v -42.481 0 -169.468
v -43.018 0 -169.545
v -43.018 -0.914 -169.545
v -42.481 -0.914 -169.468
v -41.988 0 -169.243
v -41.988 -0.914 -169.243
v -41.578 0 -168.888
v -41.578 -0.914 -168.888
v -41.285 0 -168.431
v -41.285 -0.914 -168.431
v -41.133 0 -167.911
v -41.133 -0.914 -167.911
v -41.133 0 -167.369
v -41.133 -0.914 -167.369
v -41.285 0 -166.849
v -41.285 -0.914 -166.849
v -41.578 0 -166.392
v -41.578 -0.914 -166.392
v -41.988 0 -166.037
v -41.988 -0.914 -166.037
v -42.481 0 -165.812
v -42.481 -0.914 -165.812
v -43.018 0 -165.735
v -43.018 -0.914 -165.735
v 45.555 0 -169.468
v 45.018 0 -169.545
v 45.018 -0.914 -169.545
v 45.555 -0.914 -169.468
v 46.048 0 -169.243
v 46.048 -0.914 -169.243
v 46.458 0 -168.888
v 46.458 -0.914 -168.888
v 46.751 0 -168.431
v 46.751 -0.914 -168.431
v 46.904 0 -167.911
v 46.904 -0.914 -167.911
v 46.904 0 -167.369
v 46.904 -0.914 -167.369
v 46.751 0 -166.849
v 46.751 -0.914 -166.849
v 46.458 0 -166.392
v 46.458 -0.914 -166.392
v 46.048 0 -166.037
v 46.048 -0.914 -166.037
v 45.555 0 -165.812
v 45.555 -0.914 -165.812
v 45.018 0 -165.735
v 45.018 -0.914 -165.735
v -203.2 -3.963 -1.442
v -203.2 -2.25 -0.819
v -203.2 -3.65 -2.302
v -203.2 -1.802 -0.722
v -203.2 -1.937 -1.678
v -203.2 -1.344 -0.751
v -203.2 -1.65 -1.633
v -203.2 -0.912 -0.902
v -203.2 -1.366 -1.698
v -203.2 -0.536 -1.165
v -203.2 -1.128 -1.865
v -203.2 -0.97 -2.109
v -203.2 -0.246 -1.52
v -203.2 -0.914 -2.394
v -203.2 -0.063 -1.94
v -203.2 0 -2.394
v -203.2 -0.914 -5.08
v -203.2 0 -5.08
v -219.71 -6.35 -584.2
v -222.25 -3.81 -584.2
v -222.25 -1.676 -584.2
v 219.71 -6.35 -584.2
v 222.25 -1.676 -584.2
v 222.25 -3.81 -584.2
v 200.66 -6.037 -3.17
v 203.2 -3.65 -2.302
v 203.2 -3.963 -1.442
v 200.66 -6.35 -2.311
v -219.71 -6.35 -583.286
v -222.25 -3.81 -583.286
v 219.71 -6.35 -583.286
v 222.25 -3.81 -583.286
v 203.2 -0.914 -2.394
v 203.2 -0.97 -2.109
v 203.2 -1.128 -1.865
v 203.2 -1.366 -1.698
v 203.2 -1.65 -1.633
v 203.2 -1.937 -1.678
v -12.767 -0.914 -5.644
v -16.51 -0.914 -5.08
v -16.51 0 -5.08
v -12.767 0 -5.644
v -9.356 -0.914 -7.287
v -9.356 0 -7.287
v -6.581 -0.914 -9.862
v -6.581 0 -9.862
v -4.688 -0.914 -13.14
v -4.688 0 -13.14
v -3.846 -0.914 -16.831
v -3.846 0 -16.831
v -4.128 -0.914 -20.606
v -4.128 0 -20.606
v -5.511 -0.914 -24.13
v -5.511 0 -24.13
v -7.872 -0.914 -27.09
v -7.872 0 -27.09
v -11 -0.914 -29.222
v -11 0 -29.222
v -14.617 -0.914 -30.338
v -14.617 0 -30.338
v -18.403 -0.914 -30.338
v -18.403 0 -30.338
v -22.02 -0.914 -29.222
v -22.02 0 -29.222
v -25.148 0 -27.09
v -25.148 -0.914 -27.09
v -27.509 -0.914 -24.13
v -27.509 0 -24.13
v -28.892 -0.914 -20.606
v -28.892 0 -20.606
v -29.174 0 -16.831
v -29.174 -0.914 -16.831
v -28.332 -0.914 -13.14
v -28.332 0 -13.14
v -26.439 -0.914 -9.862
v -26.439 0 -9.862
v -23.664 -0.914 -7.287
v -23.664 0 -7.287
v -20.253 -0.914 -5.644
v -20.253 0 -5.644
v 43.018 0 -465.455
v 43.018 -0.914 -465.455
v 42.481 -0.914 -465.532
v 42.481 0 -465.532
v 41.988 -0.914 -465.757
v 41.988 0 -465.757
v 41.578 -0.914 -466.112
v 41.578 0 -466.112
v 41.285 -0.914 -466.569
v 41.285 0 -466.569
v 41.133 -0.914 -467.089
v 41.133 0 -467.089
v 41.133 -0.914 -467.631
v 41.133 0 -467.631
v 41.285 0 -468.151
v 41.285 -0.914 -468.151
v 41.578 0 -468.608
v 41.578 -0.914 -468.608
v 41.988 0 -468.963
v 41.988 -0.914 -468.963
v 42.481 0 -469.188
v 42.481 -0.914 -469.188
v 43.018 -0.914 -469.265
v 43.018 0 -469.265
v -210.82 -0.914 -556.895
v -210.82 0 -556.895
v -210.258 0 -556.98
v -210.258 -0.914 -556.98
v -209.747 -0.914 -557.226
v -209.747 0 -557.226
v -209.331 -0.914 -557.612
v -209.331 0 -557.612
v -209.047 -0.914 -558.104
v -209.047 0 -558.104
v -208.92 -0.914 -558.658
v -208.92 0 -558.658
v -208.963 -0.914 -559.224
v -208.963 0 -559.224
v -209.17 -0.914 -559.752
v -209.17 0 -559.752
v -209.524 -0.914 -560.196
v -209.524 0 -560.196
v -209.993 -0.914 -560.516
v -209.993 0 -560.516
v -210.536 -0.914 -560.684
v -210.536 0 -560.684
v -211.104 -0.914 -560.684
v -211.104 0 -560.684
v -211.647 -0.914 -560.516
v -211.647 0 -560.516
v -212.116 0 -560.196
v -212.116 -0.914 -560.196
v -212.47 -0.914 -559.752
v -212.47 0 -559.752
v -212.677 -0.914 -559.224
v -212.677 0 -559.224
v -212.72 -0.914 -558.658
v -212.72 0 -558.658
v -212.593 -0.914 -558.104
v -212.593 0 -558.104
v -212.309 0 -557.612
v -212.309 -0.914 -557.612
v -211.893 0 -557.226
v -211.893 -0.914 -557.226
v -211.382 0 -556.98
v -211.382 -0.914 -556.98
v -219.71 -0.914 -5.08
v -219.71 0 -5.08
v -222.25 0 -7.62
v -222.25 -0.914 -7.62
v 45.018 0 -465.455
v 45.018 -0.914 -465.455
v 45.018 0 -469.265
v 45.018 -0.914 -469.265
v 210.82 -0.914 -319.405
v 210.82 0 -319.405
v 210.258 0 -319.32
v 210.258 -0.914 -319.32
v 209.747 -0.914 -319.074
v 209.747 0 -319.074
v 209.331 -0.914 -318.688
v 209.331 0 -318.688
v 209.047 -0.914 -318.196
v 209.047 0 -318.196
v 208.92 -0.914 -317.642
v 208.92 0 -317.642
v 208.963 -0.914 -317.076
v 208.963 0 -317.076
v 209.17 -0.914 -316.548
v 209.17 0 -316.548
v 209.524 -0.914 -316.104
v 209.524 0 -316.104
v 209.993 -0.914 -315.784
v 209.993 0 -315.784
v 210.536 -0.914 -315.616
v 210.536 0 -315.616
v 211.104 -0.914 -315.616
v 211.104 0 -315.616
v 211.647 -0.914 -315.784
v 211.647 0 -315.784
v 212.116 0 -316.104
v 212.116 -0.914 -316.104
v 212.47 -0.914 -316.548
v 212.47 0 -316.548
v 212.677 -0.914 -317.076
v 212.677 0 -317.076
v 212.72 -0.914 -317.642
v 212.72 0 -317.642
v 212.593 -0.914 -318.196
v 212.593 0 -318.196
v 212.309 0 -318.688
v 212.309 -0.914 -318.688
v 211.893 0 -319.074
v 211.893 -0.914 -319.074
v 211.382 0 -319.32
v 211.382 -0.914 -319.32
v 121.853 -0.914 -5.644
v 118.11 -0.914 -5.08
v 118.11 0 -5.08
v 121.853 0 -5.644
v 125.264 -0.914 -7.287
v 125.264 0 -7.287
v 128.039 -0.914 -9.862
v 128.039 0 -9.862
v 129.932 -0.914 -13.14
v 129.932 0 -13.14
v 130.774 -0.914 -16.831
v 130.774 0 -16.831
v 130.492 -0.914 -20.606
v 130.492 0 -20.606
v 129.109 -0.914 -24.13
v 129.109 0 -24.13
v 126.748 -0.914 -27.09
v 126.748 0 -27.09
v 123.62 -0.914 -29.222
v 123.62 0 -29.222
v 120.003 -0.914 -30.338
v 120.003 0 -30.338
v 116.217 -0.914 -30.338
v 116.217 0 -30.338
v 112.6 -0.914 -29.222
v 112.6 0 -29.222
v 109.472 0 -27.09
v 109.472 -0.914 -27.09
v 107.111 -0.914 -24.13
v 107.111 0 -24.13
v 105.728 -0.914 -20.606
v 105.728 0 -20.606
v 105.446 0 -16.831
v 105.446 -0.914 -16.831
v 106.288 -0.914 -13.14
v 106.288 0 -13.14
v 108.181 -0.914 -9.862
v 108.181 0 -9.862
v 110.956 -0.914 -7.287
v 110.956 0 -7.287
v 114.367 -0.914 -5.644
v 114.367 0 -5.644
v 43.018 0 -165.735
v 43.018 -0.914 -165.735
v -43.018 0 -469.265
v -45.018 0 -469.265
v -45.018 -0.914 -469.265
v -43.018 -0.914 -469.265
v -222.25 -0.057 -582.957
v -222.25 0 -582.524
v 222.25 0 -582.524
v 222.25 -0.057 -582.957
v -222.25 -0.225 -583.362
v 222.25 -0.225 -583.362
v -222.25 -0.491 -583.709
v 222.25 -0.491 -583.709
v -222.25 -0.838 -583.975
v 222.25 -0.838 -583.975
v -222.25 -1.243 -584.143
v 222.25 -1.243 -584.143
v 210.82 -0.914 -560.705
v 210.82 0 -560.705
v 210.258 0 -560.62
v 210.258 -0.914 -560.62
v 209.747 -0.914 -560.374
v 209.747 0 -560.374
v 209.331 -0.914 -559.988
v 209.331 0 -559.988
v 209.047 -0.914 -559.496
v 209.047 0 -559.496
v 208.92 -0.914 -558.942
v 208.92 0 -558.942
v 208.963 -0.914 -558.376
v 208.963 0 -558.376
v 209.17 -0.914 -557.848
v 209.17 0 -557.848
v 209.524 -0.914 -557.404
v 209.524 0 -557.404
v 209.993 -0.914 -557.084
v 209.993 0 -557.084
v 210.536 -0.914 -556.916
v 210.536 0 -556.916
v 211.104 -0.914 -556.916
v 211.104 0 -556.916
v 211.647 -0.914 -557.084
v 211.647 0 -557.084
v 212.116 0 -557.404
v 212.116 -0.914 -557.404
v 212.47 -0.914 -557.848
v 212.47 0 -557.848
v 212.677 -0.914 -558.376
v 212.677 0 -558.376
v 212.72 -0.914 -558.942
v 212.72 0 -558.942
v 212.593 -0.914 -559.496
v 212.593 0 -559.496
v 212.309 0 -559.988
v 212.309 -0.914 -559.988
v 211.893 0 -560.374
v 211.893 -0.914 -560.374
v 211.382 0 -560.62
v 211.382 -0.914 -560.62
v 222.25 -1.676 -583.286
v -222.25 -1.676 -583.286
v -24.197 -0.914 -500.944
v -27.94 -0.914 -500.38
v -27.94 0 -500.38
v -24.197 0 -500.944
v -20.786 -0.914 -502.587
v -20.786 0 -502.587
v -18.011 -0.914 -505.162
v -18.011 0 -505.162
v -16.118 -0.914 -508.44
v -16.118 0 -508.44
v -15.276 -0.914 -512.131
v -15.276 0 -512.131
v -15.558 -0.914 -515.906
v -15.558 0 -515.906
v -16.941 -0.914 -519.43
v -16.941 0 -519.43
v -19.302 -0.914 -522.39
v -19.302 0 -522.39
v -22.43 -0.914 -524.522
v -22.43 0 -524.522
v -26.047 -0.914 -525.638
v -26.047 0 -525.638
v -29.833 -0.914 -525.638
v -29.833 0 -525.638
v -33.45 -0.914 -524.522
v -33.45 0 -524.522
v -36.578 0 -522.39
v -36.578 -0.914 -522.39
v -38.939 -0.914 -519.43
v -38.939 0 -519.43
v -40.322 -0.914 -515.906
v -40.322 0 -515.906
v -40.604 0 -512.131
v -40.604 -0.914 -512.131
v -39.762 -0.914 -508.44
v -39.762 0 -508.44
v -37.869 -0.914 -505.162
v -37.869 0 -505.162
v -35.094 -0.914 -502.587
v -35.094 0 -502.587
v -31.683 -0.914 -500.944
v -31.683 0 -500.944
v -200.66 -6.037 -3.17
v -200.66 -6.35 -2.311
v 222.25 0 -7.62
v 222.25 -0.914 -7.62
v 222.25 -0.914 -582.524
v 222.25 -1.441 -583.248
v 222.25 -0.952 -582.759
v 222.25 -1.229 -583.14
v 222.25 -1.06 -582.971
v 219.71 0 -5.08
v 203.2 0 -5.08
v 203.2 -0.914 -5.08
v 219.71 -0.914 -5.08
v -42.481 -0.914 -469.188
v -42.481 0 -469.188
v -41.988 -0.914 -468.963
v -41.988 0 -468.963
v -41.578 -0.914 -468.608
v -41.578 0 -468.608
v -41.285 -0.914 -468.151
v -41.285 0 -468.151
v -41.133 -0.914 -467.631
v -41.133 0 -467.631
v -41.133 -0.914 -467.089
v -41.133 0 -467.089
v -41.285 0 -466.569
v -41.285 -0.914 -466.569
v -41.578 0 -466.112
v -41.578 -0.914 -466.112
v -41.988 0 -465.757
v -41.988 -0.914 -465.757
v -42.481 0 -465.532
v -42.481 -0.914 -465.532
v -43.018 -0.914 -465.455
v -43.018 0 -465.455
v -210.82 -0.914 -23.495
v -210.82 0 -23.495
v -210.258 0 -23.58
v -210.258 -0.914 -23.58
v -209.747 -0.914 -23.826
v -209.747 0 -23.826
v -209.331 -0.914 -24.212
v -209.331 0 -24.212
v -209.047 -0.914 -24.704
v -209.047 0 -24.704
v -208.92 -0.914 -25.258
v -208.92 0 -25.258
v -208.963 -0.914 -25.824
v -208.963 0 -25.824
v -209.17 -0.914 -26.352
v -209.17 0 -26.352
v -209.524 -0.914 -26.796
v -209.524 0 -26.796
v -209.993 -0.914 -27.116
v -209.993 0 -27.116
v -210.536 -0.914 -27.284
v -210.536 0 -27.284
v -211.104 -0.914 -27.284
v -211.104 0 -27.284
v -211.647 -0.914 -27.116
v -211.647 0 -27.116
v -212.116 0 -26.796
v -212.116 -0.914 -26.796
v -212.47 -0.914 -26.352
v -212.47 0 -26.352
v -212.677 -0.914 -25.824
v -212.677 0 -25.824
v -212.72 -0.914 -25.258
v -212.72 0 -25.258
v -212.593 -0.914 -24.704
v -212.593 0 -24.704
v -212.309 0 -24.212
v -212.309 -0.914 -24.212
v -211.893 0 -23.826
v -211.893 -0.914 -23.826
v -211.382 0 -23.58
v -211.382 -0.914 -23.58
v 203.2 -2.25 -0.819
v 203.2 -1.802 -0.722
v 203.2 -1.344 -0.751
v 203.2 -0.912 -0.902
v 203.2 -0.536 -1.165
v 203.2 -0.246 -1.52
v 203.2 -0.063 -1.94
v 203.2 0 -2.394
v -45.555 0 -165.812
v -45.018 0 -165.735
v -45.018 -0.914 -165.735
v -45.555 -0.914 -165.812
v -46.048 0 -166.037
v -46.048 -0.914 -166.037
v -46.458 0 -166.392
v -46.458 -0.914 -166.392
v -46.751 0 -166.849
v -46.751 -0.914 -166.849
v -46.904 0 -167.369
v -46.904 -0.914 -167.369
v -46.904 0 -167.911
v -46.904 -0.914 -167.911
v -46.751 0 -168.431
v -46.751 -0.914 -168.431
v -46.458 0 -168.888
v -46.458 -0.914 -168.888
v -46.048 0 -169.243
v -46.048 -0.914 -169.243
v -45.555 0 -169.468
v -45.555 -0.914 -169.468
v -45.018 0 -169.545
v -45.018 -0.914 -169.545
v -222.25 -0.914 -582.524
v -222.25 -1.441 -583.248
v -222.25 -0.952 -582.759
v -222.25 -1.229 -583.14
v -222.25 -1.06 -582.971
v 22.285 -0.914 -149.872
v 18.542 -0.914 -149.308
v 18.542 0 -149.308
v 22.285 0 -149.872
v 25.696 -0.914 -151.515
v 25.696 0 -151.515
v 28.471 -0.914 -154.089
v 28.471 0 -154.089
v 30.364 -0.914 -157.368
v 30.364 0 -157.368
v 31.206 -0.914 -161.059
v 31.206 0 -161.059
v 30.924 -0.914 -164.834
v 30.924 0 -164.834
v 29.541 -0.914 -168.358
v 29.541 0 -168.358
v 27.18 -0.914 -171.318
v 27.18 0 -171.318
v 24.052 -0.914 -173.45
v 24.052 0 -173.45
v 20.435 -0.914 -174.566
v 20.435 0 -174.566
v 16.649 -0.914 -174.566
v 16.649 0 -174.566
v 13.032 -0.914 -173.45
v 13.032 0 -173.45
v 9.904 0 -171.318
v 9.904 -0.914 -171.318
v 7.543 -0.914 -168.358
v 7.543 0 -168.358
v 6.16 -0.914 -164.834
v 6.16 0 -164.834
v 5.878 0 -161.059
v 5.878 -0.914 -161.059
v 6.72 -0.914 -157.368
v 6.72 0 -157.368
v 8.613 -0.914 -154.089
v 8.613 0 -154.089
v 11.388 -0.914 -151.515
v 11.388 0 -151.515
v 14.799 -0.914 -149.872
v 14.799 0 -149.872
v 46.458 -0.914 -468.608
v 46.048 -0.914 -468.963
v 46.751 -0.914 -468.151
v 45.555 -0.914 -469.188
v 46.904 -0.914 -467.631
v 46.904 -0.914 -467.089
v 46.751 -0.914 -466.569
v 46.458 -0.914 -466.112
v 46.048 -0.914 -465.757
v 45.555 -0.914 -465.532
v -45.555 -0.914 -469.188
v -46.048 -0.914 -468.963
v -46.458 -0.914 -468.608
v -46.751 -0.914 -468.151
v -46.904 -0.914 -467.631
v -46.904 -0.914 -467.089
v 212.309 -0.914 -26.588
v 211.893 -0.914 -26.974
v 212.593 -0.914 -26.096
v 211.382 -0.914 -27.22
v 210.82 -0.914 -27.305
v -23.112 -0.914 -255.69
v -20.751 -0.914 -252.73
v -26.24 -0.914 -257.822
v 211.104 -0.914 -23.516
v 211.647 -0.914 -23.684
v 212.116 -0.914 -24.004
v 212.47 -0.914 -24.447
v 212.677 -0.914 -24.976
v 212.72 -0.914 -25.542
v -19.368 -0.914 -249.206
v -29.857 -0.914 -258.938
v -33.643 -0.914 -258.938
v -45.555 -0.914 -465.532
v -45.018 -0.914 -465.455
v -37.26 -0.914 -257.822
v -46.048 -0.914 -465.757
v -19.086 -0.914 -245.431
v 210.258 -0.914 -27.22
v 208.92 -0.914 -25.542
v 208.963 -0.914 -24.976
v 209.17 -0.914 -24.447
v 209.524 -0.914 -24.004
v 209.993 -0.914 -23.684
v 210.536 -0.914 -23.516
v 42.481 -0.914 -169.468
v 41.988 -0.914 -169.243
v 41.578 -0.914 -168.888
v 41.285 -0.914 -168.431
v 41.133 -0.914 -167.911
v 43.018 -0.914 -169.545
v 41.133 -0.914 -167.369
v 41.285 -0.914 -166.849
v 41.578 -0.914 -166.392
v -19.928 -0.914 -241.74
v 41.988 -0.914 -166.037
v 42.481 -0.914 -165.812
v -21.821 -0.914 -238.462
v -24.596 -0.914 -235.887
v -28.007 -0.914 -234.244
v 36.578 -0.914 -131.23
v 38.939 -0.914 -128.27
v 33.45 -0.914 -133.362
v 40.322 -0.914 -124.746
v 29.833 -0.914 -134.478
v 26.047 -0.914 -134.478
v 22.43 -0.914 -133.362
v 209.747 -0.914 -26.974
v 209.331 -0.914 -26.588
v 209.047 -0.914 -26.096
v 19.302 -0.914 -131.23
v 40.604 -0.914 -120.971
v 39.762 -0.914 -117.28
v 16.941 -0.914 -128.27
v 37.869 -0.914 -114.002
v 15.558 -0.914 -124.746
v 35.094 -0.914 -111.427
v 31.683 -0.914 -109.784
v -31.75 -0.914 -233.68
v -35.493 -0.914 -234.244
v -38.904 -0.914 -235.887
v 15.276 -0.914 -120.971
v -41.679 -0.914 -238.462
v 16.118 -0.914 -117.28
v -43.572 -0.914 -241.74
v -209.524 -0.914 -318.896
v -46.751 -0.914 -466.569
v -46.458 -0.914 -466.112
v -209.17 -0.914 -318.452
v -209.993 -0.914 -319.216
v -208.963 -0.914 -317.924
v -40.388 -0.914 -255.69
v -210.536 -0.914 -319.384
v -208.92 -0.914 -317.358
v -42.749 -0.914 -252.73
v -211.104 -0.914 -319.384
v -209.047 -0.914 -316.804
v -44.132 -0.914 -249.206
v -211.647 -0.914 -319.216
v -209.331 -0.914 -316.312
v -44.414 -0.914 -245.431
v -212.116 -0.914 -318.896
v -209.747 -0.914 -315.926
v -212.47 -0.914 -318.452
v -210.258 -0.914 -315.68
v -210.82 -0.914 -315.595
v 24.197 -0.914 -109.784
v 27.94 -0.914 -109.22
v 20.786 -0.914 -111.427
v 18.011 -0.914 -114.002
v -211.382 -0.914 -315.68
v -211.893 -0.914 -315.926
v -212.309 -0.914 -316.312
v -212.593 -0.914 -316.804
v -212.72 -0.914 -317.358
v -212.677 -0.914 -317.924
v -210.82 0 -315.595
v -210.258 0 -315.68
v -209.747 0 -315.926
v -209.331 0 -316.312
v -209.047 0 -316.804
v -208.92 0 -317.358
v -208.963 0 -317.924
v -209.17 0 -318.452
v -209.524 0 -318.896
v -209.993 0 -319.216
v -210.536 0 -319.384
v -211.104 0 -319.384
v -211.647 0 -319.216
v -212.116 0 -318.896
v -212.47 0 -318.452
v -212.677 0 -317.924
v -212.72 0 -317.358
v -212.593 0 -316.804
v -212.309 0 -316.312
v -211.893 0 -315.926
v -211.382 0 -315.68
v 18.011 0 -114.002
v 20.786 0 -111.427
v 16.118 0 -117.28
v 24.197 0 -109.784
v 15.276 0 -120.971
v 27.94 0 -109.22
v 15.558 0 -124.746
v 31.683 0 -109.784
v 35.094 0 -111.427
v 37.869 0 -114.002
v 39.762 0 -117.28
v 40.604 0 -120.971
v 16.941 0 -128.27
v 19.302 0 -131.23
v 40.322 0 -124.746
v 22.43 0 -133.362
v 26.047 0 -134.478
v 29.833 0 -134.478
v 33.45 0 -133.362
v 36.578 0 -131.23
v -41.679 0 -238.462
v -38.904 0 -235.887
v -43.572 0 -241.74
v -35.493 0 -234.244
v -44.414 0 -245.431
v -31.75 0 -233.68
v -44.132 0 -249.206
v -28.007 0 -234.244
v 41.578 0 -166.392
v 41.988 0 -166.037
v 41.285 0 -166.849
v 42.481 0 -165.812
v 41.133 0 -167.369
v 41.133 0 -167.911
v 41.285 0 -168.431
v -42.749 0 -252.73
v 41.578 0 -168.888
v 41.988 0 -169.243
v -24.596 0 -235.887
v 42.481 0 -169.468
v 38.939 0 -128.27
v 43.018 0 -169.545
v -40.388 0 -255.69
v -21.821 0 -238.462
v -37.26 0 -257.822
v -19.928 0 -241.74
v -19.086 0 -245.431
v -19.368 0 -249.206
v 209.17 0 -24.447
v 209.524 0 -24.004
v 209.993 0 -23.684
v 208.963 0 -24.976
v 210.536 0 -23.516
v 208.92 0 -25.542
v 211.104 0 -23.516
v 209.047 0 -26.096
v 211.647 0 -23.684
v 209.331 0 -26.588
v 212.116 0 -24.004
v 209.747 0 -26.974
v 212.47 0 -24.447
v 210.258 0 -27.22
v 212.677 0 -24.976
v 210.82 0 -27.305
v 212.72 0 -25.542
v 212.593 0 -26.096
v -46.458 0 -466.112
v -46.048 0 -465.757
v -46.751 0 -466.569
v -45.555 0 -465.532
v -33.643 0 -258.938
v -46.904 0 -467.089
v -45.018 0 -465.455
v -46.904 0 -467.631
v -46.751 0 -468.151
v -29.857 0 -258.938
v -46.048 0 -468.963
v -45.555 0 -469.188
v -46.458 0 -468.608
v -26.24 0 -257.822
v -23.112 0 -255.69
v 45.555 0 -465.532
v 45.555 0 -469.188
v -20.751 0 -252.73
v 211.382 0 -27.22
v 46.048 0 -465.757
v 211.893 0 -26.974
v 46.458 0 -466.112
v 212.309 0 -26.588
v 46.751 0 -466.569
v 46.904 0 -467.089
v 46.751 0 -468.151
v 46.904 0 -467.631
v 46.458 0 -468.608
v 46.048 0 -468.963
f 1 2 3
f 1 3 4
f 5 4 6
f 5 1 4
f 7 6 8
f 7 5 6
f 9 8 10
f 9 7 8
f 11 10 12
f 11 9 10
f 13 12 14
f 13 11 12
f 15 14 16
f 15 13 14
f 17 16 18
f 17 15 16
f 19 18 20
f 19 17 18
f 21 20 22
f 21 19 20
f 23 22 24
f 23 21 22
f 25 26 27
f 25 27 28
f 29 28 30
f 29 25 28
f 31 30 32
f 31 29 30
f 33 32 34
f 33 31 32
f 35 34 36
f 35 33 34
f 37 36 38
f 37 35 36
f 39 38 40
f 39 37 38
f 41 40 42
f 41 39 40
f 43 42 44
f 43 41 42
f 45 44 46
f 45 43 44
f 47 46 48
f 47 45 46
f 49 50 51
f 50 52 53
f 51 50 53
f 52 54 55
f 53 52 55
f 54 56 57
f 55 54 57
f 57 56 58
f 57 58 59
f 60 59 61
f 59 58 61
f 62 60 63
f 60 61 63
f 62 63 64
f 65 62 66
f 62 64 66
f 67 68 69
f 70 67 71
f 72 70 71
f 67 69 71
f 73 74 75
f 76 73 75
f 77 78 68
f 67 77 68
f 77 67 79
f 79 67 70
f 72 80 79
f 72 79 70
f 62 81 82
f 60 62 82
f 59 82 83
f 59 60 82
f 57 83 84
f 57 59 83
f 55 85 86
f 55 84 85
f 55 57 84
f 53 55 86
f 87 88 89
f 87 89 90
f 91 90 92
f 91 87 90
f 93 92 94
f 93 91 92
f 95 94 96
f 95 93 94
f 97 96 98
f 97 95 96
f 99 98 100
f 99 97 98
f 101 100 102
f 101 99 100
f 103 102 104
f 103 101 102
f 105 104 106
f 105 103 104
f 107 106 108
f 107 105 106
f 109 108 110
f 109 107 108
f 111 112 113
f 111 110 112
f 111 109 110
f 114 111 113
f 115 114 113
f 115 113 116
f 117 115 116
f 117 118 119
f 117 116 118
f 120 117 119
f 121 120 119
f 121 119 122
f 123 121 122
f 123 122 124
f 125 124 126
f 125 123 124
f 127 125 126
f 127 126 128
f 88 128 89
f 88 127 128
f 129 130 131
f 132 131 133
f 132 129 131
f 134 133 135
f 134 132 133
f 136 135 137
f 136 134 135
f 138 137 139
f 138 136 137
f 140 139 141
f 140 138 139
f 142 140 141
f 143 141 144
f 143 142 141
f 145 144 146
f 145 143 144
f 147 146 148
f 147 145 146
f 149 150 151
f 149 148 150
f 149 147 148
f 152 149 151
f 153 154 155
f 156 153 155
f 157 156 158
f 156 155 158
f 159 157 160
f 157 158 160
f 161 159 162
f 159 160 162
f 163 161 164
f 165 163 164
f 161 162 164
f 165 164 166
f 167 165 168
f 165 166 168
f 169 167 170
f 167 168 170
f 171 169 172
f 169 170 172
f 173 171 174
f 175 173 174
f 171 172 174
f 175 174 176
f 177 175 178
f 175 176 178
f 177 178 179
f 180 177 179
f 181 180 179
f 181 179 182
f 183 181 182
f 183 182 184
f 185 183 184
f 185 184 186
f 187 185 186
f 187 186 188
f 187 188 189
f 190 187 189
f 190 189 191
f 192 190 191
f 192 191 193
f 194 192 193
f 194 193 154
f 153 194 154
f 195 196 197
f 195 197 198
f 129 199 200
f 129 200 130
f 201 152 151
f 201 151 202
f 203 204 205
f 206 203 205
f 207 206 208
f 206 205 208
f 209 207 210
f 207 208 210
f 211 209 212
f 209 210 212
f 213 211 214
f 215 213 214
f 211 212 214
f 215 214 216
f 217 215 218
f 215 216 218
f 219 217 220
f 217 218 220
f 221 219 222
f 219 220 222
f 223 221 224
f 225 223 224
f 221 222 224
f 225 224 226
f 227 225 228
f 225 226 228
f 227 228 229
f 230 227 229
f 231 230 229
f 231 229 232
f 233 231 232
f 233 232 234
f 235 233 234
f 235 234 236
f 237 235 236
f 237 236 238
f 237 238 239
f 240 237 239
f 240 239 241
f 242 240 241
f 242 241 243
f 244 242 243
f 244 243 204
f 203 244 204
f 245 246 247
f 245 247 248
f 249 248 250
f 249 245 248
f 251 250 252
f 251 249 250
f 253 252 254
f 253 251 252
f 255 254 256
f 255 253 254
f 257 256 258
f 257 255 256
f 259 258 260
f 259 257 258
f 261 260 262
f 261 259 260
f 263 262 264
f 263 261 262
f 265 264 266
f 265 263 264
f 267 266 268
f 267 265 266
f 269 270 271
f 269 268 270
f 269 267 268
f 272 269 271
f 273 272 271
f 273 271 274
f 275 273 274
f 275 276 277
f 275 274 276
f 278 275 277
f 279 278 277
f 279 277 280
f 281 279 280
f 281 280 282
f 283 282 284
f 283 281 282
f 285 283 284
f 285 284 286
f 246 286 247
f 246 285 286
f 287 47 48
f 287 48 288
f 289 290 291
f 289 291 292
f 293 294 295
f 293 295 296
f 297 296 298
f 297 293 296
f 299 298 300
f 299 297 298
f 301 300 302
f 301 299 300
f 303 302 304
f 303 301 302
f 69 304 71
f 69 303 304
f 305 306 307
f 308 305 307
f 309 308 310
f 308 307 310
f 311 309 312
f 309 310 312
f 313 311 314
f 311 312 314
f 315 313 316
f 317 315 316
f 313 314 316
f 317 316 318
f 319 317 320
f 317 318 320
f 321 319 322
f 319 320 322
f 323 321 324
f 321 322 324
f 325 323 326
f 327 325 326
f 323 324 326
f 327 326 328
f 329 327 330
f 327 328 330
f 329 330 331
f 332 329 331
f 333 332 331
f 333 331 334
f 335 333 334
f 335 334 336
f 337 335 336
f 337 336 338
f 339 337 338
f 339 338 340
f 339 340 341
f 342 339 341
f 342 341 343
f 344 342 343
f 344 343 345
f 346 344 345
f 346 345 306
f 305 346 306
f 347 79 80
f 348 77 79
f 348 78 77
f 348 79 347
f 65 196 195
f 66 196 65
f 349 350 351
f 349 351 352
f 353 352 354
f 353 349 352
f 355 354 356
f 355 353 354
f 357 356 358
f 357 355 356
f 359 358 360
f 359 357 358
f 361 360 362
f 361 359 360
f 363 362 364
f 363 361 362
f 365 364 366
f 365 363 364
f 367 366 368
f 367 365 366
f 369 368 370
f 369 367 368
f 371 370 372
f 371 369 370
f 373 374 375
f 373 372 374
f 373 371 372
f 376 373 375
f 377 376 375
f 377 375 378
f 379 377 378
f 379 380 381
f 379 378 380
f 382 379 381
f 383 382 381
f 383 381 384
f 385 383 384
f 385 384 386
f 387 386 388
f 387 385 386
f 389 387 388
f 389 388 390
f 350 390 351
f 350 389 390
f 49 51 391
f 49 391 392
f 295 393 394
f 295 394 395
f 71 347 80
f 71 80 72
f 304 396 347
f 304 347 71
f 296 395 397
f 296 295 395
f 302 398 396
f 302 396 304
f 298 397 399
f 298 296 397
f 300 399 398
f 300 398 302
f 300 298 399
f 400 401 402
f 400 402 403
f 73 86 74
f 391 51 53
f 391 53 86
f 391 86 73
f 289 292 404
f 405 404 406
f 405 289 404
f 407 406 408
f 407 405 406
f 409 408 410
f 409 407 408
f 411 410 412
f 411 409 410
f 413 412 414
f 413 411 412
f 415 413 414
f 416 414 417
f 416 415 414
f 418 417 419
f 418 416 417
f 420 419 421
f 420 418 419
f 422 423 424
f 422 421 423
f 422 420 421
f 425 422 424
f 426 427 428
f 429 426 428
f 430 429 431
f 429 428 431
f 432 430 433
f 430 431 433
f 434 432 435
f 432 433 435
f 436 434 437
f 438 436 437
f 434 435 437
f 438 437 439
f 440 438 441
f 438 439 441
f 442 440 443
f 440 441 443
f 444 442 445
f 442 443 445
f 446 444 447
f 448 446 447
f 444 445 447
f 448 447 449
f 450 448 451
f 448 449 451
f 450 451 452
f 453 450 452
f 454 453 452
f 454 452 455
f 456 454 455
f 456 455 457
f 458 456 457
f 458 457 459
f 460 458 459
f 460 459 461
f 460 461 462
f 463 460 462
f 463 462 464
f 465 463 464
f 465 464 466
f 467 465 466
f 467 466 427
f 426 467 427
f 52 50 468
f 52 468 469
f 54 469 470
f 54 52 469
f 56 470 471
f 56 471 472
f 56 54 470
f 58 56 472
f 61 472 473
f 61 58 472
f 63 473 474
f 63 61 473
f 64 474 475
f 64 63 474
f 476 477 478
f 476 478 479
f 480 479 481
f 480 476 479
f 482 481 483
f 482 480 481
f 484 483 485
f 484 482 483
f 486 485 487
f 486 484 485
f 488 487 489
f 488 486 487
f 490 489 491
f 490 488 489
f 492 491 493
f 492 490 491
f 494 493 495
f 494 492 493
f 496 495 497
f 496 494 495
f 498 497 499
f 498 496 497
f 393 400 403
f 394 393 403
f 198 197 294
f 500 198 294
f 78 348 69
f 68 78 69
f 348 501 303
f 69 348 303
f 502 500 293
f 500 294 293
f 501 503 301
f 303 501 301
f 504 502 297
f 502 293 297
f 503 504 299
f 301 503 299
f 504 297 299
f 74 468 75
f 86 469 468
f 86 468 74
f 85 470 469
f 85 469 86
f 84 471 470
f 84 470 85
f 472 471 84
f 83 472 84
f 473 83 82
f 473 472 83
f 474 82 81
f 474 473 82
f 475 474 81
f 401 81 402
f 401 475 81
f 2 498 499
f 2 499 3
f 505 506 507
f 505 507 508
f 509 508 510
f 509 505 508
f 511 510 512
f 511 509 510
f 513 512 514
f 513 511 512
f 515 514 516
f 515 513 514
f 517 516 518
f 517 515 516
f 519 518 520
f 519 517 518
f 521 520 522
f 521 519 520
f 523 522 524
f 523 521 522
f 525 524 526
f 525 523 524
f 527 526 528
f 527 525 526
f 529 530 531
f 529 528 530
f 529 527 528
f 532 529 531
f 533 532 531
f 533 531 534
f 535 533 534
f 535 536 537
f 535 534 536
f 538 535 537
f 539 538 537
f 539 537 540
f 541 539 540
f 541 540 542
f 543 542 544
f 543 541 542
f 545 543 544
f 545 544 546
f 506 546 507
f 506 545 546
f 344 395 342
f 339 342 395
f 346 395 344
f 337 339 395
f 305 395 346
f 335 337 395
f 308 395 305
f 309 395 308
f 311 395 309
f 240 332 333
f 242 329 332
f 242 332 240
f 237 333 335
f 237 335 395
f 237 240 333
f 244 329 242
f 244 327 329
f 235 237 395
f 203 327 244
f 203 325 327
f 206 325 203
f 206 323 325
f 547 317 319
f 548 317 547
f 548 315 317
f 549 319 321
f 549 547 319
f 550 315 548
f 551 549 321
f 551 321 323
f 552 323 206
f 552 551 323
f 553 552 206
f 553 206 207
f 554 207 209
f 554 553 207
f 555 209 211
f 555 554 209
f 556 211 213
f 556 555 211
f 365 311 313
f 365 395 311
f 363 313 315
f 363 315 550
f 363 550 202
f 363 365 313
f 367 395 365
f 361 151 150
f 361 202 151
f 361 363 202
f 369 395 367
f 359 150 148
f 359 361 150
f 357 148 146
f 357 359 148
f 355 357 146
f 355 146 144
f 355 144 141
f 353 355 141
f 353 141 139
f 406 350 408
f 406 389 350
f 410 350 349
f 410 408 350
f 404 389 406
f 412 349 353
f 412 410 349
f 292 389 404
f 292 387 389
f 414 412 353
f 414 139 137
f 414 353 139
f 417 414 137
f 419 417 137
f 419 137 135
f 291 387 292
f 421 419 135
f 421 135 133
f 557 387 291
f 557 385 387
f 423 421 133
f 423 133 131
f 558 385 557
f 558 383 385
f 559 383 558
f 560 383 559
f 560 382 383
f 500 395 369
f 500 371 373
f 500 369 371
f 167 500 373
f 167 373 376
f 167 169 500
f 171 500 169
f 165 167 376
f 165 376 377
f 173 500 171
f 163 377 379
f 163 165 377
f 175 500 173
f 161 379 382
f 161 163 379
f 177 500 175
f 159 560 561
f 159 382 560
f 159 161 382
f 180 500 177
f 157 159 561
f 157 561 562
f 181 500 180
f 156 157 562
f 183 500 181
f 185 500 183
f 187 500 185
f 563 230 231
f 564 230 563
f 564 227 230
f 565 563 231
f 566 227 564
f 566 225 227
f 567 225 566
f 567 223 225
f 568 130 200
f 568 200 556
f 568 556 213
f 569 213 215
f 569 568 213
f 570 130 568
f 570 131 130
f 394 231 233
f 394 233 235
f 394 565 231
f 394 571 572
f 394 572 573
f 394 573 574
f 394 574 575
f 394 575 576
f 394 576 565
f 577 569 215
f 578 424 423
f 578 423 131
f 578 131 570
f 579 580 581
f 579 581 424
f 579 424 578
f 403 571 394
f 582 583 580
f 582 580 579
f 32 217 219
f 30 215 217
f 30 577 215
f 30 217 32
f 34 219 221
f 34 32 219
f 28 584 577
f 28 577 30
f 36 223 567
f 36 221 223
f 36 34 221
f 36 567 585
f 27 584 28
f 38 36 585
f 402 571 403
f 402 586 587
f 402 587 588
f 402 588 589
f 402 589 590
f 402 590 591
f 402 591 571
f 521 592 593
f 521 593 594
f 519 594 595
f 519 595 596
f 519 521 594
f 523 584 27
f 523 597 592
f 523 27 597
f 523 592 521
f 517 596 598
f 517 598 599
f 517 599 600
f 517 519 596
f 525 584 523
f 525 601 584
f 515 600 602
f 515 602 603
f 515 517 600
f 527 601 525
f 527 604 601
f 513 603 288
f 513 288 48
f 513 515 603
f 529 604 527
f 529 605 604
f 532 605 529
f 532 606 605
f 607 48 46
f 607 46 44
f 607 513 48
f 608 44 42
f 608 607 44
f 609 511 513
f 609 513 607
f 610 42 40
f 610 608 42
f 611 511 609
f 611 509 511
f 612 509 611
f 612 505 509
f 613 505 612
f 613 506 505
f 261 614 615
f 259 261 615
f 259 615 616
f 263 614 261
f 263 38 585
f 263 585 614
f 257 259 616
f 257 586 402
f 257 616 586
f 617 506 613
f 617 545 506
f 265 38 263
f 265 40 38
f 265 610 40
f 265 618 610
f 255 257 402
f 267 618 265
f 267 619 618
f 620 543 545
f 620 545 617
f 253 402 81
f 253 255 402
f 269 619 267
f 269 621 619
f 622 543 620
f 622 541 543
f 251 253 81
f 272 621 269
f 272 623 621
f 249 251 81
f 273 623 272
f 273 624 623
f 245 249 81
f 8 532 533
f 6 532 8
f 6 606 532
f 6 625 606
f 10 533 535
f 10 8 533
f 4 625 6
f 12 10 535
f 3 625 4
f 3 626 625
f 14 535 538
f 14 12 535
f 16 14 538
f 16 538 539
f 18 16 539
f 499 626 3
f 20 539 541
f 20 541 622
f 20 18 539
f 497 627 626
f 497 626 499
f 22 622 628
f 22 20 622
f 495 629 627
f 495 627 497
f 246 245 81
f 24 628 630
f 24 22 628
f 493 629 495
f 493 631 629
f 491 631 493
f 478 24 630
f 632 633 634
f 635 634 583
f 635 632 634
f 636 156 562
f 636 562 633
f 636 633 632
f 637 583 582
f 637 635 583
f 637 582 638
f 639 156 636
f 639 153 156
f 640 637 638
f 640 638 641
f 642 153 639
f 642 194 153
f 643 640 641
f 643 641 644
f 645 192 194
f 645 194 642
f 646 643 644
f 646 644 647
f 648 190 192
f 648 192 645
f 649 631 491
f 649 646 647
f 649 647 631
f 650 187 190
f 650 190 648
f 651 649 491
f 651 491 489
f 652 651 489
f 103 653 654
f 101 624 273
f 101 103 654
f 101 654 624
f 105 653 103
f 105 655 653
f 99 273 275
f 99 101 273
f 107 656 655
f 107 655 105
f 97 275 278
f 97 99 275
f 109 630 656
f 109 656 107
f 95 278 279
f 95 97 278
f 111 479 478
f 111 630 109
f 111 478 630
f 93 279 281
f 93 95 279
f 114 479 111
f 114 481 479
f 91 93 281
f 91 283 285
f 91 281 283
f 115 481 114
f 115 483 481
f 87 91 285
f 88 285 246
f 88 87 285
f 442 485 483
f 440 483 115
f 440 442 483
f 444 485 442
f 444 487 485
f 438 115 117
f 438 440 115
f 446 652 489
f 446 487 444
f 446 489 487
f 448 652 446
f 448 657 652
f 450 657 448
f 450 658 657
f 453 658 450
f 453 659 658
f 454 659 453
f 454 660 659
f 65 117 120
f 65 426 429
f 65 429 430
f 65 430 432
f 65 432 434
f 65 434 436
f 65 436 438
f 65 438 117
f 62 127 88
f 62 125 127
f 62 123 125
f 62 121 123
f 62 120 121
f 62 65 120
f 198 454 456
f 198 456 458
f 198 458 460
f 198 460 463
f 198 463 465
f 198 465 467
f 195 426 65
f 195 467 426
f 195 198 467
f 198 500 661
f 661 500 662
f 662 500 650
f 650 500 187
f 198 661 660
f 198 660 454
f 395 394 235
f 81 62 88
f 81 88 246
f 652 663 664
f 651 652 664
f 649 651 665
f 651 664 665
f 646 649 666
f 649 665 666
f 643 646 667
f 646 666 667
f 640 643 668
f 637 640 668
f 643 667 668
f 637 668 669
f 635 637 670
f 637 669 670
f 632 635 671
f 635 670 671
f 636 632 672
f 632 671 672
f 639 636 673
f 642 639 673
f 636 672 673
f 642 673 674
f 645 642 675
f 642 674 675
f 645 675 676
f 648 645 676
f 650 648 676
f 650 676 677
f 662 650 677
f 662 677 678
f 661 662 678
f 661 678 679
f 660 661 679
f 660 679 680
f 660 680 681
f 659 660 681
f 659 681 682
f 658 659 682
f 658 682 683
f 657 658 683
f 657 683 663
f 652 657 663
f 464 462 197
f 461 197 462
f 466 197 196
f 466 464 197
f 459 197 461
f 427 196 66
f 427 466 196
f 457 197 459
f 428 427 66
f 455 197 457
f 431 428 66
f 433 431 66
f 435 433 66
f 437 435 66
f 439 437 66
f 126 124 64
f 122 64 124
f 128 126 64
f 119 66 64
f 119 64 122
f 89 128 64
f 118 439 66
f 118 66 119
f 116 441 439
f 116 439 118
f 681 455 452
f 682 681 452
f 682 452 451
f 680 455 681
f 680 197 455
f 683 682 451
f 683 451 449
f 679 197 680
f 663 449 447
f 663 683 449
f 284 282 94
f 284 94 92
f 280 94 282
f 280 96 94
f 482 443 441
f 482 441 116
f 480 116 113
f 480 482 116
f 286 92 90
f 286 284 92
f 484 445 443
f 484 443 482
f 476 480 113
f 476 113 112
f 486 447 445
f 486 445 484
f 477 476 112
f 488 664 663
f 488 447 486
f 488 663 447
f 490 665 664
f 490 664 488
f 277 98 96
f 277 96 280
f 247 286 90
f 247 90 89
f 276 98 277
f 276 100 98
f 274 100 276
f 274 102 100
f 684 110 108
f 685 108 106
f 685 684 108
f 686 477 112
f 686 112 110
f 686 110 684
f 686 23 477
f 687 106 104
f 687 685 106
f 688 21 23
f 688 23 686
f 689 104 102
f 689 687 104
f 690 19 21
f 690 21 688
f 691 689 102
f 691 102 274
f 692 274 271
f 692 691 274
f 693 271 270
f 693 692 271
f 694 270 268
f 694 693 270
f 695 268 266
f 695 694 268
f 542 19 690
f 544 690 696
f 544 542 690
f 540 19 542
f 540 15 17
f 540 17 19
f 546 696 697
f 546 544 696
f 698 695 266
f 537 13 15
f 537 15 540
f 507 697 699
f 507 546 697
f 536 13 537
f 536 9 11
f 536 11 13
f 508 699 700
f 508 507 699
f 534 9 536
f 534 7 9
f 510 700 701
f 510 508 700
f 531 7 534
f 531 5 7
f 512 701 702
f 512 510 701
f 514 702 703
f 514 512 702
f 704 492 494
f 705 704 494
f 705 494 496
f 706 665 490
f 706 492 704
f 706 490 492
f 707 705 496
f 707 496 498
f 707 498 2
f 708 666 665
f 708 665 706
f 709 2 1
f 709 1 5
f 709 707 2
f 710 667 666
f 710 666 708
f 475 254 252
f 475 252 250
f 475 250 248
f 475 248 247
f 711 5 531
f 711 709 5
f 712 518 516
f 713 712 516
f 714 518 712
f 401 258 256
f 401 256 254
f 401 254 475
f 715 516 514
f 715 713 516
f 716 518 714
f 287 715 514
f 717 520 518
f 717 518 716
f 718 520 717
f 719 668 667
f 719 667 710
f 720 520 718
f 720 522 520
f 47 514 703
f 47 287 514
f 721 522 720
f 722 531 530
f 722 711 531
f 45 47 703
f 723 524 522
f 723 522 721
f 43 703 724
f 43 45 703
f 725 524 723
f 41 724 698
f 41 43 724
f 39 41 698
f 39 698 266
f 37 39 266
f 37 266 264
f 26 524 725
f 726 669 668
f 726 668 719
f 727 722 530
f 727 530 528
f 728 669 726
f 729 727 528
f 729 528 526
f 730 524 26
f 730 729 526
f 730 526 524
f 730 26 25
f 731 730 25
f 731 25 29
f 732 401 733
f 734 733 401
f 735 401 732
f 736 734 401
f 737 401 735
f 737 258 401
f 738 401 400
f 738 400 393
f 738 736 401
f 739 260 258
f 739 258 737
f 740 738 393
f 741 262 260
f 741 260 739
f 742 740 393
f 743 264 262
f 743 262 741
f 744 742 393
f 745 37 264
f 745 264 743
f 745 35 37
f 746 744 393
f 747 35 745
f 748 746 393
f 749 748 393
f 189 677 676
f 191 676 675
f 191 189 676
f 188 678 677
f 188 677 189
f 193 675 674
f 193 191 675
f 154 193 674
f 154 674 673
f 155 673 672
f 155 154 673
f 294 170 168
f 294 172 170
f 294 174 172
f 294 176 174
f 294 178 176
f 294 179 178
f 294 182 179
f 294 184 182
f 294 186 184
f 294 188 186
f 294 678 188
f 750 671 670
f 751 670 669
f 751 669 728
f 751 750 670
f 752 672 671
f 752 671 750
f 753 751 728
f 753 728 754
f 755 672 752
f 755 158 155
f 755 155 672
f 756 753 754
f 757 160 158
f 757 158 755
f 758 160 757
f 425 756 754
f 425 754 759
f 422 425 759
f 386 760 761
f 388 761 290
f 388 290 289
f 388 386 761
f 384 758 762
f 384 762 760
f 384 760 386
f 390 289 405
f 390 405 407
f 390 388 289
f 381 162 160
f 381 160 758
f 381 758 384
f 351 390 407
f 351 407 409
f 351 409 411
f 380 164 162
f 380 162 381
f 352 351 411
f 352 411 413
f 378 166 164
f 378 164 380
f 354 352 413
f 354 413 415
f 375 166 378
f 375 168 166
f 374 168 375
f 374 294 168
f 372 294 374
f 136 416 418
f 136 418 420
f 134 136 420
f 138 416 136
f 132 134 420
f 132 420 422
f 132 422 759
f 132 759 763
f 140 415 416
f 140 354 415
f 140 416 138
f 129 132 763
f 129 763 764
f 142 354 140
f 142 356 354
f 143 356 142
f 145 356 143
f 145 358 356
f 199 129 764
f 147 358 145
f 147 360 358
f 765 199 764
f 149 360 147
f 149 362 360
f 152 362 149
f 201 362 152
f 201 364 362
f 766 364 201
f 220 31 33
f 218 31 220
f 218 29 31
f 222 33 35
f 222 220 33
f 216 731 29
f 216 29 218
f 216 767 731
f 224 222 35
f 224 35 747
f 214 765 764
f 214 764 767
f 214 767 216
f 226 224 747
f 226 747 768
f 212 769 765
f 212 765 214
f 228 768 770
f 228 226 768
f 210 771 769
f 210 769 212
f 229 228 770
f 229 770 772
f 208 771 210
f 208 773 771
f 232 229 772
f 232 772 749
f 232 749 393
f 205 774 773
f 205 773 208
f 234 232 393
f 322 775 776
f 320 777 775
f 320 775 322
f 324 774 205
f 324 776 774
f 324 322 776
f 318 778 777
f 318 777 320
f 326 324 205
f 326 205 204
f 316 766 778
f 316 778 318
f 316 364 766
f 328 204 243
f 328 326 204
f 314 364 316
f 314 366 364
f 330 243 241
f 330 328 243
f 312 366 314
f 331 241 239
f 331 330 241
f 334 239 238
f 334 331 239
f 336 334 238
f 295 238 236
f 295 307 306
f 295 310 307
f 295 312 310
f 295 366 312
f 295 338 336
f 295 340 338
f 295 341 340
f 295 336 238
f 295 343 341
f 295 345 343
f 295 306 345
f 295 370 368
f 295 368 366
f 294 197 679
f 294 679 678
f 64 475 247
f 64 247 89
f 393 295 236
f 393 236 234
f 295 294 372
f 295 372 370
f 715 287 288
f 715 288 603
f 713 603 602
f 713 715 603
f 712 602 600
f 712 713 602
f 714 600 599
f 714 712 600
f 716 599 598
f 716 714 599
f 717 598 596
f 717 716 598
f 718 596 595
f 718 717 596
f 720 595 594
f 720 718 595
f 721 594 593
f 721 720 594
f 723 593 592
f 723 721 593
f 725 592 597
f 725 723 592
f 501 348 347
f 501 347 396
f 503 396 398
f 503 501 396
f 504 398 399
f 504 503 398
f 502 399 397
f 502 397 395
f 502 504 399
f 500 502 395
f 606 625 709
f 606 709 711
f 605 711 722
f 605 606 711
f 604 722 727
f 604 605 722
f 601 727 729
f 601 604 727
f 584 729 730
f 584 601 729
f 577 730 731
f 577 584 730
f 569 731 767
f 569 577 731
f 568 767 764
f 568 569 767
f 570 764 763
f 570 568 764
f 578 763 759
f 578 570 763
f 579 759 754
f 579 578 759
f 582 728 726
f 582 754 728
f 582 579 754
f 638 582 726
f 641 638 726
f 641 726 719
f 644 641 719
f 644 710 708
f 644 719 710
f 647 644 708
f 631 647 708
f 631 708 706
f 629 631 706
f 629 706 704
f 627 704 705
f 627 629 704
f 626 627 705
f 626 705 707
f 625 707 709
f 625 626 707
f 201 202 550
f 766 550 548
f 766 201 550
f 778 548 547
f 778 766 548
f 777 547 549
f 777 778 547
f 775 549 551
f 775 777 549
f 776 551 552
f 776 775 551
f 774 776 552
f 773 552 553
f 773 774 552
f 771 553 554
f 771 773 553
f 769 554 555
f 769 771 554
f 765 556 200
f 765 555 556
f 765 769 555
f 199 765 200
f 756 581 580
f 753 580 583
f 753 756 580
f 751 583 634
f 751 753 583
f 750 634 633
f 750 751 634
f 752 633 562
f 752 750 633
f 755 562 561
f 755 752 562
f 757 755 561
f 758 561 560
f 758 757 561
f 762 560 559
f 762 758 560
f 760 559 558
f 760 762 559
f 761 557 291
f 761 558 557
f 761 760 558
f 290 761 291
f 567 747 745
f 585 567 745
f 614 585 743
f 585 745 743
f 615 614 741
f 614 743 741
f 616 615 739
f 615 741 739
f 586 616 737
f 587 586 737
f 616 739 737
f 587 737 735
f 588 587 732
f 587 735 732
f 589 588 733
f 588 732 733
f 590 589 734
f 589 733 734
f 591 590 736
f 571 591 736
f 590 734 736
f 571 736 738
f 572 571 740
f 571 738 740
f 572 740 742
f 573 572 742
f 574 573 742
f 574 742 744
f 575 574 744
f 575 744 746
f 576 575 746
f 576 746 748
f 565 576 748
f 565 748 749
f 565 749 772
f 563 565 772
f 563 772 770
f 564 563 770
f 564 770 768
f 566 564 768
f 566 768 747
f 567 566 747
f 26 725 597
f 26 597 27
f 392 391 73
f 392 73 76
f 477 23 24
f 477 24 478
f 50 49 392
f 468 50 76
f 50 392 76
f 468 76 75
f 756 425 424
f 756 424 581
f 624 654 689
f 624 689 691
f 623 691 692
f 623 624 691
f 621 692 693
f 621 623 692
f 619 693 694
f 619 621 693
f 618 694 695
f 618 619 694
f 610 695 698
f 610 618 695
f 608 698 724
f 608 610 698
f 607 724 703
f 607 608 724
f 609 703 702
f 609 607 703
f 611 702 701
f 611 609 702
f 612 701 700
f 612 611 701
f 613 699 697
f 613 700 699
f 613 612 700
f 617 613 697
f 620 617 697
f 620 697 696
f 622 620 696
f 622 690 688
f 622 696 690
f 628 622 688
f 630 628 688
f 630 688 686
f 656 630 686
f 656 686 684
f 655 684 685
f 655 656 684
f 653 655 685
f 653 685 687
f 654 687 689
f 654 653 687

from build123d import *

# Parameters (mm, degrees)
SKETCH2_W               = 444.5
SKETCH2_H               = 584.2
BOSS_EXTRUDE1_DEPTH     = 6.35
MOVE_START              = -2.17182791
MOVE_FACE1_OUTLINE_W    = 448
MOVE_FACE1_OUTLINE_H    = 9
MOVE_FACE1_DEPTH        = 2.17182791
CONVERT_SOLID1_START    = -222.25
CONVERT_SOLID1_DEPTH    = 444.5
SKETCH7_W               = 19.05
SKETCH7_H               = 5.08
CUT_EXTRUDE1_DEPTH      = 626.080014878
SKETCH9_R               = 1.905
CUT_EXTRUDE2_DEPTH      = 1.2192
CHAMFER1_SIZE           = 2.54
CUT_EXTRUDE3_DEPTH      = 626.080014878
CUT_EXTRUDE3_DEPTH_BACK = 626.080014878
SKETCH10_R              = 12.7


# Read off the part's stored shape, not the designer's step: Move Face1, Convert-Solid1
with BuildPart() as part:
    # Sketch2 → Boss-Extrude1 (new body)
    with BuildSketch(Plane(origin=(0, 0, 0), x_dir=(1, 0, 0), z_dir=(0, 1, 0))):
        with Locations((0, 292.1)):
            Rectangle(SKETCH2_W, SKETCH2_H)
    extrude(amount=-BOSS_EXTRUDE1_DEPTH)

    # Move Face1 outline → Move Face1 (cut)
    with BuildSketch(Plane(origin=(0, 0, 0), x_dir=(1, 0, 0), z_dir=(0, 0.3420201433256691, -0.9396926207859083)).offset(MOVE_START)):
        with Locations((0, 3.5)):
            Rectangle(MOVE_FACE1_OUTLINE_W, MOVE_FACE1_OUTLINE_H)
    extrude(amount=MOVE_FACE1_DEPTH, mode=Mode.SUBTRACT)

    # Convert-Solid1 outline → Convert-Solid1 (cut)
    with BuildSketch(Plane.YZ.offset(CONVERT_SOLID1_START)):
        with BuildLine():
            Line((-6.037256781, -3.17046592), (-6.35, -2.311210988))
            Line((-6.35, -2.311210988), (-6.35, -583.2856))
            Line((-6.35, -583.2856), (-1.6764, -583.2856))
            ThreePointArc((-1.6764, -583.2856), (-1.137584633, -583.062415367), (-0.9144, -582.5236))
            Line((-0.9144, -582.5236), (-0.9144, -2.394147319))
            ThreePointArc((-0.9144, -2.394147319), (-1.239334756, -1.769953461), (-1.937019349, -1.678101541))
            Line((-1.937019349, -1.678101541), (-6.037256781, -3.17046592))
        make_face()
        with BuildLine():
            Line((0, 0), (-2.249762568, -0.818846609))
            ThreePointArc((-2.249762568, -0.818846609), (-0.714856462, -1.020920831), (0, -2.394147319))
            Line((0, -2.394147319), (0, 0))
        make_face()
        with BuildLine():
            Line((0, -584.2), (0, -582.5236))
            ThreePointArc((0, -582.5236), (-0.491006192, -583.708993808), (-1.6764, -584.2))
            Line((-1.6764, -584.2), (0, -584.2))
        make_face()
    extrude(amount=CONVERT_SOLID1_DEPTH, mode=Mode.SUBTRACT)

    # Sketch7 → Cut-Extrude1 (cut, through all)
    with BuildSketch(Plane(origin=(0, 0, 0), x_dir=(1, 0, 0), z_dir=(0, 1, 0))):
        with Locations((-212.725, 2.54)):
            Rectangle(SKETCH7_W, SKETCH7_H)
        with Locations((212.725, 2.54)):
            Rectangle(SKETCH7_W, SKETCH7_H)
    extrude(amount=-CUT_EXTRUDE1_DEPTH, mode=Mode.SUBTRACT)

    # Sketch9 → Cut-Extrude2 (cut)
    with BuildSketch(Plane(origin=(0, 0, 0), x_dir=(1, 0, 0), z_dir=(0, 1, 0))):
        with Locations(Location((-210.82, 25.4, 0), (0, 0, 270))):
            Circle(SKETCH9_R)
        with Locations(Location((-210.82, 317.5, 0), (0, 0, 270))):
            Circle(SKETCH9_R)
        with Locations(Location((-210.82, 558.8, 0), (0, 0, 270))):
            Circle(SKETCH9_R)
        with Locations(Location((210.82, 558.8, 0), (0, 0, 90))):
            Circle(SKETCH9_R)
        with Locations(Location((210.82, 317.5, 0), (0, 0, 90))):
            Circle(SKETCH9_R)
        with Locations(Location((210.82, 25.4, 0), (0, 0, 90))):
            Circle(SKETCH9_R)
        with BuildLine():
            Line((-43.0182, 465.455), (-45.0182, 465.455))
            ThreePointArc((-45.0182, 465.455), (-46.9232, 467.36), (-45.0182, 469.265))
            Line((-45.0182, 469.265), (-43.0182, 469.265))
            ThreePointArc((-43.0182, 469.265), (-41.1132, 467.36), (-43.0182, 465.455))
        make_face()
        with BuildLine():
            Line((45.0182, 465.455), (43.0182, 465.455))
            ThreePointArc((43.0182, 465.455), (41.1132, 467.36), (43.0182, 469.265))
            Line((43.0182, 469.265), (45.0182, 469.265))
            ThreePointArc((45.0182, 469.265), (46.9232, 467.36), (45.0182, 465.455))
        make_face()
        with BuildLine():
            Line((-43.0182, 165.735), (-45.0182, 165.735))
            ThreePointArc((-45.0182, 165.735), (-46.9232, 167.64), (-45.0182, 169.545))
            Line((-45.0182, 169.545), (-43.0182, 169.545))
            ThreePointArc((-43.0182, 169.545), (-41.1132, 167.64), (-43.0182, 165.735))
        make_face()
        with BuildLine():
            Line((45.0182, 165.735), (43.0182, 165.735))
            ThreePointArc((43.0182, 165.735), (41.1132, 167.64), (43.0182, 169.545))
            Line((43.0182, 169.545), (45.0182, 169.545))
            ThreePointArc((45.0182, 169.545), (46.9232, 167.64), (45.0182, 165.735))
        make_face()
    extrude(amount=-CUT_EXTRUDE2_DEPTH, mode=Mode.SUBTRACT)

    # Chamfer1
    chamfer1_edges = [part.edges().sort_by_distance(p)[0] for p in [
        (-222.25, -6.35, -583.7428),
        (222.25, -6.35, -583.7428),
        (-222.25, -0.4572, -5.08),
        (-203.2, -6.193628391, -2.740838454),
        (222.25, -0.4572, -5.08),
        (203.2, -6.193628391, -2.740838454),
    ]]
    chamfer(chamfer1_edges, length=CHAMFER1_SIZE)

    # Sketch10 → Cut-Extrude3 (cut, two sides: drawn at the far end of the back side and taken through both)
    with BuildSketch(Plane(origin=(0, 0, 0), x_dir=(1, 0, 0), z_dir=(0, 1, 0)).offset(-CUT_EXTRUDE3_DEPTH_BACK)):
        with Locations(Location((18.542, 162.007747319, 0), (0, 0, 270))):
            Circle(SKETCH10_R)
        with Locations(Location((-16.51, 17.78, 0), (0, 0, 270))):
            Circle(SKETCH10_R)
        with Locations(Location((-31.75, 246.38, 0), (0, 0, 270))):
            Circle(SKETCH10_R)
        with Locations(Location((118.11, 17.78, 0), (0, 0, 270))):
            Circle(SKETCH10_R)
        with Locations(Location((-27.94, 513.08, 0), (0, 0, 270))):
            Circle(SKETCH10_R)
        with Locations(Location((27.94, 121.92, 0), (0, 0, 270))):
            Circle(SKETCH10_R)
    extrude(amount=CUT_EXTRUDE3_DEPTH + CUT_EXTRUDE3_DEPTH_BACK, mode=Mode.SUBTRACT)


solid = part.part
